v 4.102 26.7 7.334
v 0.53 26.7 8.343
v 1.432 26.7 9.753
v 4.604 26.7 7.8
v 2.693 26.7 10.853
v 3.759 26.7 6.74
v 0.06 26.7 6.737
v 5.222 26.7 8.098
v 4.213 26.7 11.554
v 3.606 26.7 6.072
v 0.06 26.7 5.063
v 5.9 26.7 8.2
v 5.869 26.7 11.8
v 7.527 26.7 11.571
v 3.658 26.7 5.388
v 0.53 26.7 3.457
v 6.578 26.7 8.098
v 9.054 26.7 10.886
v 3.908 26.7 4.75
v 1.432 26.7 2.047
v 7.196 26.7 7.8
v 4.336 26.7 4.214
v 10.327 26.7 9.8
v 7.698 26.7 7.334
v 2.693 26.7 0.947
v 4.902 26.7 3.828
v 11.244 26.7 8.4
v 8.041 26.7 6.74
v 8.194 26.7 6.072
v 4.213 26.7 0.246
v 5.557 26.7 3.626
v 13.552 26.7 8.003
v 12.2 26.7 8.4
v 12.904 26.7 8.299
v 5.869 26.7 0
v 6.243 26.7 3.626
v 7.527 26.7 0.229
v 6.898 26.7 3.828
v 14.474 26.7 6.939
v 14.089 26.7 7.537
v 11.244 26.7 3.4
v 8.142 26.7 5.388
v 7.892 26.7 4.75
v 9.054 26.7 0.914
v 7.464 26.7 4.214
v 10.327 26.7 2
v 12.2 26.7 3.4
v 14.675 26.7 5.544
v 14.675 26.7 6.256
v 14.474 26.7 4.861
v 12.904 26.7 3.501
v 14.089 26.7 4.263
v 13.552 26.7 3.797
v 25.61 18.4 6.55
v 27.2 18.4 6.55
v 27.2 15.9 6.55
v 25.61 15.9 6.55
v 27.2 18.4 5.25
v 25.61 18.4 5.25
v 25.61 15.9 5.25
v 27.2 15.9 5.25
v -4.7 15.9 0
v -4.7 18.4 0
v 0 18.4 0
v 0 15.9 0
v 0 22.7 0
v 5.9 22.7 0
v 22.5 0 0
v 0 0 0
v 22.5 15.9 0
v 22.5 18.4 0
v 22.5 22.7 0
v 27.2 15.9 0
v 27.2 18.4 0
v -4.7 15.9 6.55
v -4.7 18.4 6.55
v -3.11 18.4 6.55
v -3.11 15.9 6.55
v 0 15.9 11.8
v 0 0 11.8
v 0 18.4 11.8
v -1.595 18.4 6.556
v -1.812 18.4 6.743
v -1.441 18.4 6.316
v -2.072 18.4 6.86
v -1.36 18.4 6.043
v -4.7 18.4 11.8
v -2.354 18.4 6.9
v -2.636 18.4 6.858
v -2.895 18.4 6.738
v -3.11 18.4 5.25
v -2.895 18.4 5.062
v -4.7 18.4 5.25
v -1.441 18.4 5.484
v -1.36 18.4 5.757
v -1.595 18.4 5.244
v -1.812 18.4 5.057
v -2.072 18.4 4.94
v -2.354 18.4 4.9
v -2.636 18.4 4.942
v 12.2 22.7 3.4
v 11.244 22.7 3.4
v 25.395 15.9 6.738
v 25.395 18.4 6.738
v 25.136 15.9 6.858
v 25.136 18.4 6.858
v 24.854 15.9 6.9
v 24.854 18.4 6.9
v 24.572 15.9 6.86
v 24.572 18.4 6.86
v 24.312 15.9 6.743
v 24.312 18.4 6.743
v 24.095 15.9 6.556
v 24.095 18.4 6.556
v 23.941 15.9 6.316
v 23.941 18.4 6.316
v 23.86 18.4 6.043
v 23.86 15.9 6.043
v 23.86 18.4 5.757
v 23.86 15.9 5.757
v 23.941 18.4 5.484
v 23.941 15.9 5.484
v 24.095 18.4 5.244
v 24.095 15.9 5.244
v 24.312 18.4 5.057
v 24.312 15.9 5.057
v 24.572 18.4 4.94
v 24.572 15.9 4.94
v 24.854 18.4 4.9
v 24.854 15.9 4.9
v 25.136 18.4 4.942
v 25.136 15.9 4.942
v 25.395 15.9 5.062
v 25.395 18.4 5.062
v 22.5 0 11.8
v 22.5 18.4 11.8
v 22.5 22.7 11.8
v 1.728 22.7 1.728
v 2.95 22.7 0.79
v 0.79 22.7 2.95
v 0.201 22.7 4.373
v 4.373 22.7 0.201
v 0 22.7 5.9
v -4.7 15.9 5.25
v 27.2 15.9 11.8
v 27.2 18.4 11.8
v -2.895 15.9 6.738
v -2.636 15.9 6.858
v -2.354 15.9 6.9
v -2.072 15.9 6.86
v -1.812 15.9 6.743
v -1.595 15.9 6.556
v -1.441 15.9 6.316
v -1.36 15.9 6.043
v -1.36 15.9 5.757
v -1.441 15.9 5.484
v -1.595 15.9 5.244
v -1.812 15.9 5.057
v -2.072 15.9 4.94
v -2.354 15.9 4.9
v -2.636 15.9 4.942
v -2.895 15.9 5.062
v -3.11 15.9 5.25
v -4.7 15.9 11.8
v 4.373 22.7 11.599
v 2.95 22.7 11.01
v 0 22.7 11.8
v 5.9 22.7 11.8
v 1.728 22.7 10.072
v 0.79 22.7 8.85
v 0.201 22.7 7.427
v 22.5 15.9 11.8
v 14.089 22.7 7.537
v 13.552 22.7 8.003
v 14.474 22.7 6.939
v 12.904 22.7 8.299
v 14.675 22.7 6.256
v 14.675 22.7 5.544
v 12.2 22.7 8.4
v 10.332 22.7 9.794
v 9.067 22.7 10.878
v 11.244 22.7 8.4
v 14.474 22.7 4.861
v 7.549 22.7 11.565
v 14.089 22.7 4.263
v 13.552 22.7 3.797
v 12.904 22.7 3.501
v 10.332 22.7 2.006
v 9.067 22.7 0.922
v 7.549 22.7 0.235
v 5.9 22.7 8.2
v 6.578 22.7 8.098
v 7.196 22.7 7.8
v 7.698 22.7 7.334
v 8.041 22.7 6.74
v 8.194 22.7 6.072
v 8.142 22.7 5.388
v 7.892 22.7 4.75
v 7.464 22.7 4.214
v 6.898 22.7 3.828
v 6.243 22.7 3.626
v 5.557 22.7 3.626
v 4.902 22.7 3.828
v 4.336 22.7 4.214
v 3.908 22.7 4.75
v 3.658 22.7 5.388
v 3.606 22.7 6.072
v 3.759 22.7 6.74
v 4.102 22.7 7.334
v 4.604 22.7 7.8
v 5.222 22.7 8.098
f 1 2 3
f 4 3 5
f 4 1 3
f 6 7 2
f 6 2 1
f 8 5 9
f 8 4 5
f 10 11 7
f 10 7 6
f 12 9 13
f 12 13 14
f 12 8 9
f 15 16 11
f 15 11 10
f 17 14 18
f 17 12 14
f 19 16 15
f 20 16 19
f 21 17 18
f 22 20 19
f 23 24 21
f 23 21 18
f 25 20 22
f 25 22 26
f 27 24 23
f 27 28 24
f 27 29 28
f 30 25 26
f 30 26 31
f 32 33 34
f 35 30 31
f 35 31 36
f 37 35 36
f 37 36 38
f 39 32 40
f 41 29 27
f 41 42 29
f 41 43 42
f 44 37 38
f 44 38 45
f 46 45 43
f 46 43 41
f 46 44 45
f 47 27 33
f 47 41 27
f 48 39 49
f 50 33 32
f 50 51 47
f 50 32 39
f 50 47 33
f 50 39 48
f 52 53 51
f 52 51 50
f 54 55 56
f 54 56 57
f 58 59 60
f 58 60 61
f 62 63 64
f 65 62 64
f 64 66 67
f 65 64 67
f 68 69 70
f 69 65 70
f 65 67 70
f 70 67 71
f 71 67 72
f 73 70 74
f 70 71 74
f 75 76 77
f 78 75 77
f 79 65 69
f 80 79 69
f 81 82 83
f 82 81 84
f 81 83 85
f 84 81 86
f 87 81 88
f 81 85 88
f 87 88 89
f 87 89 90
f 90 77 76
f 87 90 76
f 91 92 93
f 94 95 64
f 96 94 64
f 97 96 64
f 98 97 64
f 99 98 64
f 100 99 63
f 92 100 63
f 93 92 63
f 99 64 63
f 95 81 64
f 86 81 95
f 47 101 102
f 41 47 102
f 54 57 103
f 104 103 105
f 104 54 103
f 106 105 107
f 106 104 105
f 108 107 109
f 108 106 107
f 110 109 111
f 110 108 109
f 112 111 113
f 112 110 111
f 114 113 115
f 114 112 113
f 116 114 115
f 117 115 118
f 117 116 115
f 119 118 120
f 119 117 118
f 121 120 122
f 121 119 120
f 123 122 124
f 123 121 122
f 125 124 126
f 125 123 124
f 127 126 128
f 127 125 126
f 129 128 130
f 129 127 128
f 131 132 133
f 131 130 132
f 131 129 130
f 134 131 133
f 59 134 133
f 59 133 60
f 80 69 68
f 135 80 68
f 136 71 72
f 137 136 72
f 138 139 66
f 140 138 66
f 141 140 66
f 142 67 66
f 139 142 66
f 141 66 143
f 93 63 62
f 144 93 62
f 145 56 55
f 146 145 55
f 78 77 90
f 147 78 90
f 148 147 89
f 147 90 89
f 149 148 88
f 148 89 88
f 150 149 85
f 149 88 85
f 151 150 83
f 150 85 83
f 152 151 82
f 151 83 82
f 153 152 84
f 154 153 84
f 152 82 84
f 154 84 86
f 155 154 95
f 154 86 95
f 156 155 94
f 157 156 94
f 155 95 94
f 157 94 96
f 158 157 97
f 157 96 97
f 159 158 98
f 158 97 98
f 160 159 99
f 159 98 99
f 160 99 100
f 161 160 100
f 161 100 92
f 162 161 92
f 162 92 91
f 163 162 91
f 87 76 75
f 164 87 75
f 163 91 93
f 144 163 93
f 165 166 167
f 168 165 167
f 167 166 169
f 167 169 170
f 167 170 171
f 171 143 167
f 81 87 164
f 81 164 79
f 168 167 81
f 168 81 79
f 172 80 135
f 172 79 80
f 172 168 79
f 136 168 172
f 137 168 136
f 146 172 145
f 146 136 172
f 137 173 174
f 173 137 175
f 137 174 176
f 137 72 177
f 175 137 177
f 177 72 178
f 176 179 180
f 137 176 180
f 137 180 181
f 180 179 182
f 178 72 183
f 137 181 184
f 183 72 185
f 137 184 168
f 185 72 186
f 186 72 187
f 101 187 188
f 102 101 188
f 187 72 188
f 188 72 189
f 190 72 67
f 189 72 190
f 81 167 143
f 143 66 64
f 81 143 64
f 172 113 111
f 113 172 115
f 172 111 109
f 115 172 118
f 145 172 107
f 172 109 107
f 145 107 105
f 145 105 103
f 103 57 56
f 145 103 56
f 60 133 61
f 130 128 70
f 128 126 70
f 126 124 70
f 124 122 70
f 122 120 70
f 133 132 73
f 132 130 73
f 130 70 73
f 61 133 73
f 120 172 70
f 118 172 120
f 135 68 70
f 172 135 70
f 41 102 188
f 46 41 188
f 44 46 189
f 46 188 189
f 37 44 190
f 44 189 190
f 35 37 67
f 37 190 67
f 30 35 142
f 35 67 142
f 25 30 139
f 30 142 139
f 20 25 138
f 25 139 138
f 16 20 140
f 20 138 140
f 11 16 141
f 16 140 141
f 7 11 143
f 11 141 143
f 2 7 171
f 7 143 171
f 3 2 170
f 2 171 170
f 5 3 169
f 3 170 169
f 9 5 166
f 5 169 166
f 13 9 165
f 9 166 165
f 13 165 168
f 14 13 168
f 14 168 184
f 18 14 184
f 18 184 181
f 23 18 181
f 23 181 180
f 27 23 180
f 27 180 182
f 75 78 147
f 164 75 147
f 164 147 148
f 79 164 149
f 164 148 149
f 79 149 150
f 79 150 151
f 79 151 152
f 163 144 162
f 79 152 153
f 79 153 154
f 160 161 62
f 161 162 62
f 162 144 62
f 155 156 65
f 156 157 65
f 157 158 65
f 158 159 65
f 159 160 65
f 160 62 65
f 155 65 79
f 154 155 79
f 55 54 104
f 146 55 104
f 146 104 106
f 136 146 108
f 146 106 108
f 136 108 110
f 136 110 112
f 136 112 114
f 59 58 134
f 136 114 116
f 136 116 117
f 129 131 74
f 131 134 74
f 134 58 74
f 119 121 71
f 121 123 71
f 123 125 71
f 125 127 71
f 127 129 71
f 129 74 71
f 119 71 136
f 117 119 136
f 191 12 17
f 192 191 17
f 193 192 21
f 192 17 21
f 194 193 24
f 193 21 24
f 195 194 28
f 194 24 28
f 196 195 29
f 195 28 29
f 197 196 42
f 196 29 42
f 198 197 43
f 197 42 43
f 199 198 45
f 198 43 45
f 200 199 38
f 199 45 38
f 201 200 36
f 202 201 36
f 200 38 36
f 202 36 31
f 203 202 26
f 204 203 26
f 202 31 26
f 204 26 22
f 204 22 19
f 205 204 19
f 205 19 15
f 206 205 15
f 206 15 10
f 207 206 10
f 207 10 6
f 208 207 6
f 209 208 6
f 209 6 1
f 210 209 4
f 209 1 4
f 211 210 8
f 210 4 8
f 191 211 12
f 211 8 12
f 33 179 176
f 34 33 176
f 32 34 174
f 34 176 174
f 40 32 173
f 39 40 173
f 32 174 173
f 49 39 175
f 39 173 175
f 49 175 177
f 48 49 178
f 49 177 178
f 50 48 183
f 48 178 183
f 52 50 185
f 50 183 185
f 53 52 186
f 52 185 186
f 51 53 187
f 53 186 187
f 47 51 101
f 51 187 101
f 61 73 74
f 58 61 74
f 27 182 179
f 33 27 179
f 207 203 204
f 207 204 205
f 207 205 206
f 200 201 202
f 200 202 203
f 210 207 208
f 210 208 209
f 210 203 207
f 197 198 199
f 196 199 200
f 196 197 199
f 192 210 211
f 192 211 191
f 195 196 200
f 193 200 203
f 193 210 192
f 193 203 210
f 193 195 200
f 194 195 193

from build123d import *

# Parameters (mm, degrees)
BOSS_EXTRUDE1_DEPTH = 11.8
BOSS_EXTRUDE2_DEPTH = 4
SKETCH3_R           = 2.3
CUT_EXTRUDE1_DEPTH  = 4
CUT_EXTRUDE2_DEPTH  = 4


with BuildPart() as part:
    # Sketch1 → Boss-Extrude1 (new body)
    with BuildSketch(Plane.XY):
        Polygon((0, 0), (22.5, 0), (22.5, 15.9), (27.2, 15.9), (27.2, 18.4), (22.5, 18.4), (22.5, 22.7), (0, 22.7), (0, 18.4), (-4.7, 18.4), (-4.7, 15.9), (0, 15.9), align=None)
    extrude(amount=BOSS_EXTRUDE1_DEPTH)

    # Sketch2 → Boss-Extrude2 (add)
    with BuildSketch(Plane(origin=(0, 22.7, 0), x_dir=(1, 0, 0), z_dir=(0, 1, 0))):
        with BuildLine():
            Line((12.2, -3.4), (11.244155686, -3.4))
            ThreePointArc((11.244155686, -3.4), (0, -5.9), (11.244155686, -8.4))
            Line((11.244155686, -8.4), (12.2, -8.4))
            ThreePointArc((12.2, -8.4), (14.7, -5.9), (12.2, -3.4))
        make_face()
    extrude(amount=BOSS_EXTRUDE2_DEPTH)

    # Sketch3 → Cut-Extrude1 (cut)
    with BuildSketch(Plane(origin=(0, 26.7, 0), x_dir=(1, 0, 0), z_dir=(0, 1, 0))):
        with Locations(Location((5.9, -5.9, 0), (0, 0, 270))):
            Circle(SKETCH3_R)
    extrude(amount=-CUT_EXTRUDE1_DEPTH, mode=Mode.SUBTRACT)

    # Sketch4 → Cut-Extrude2 (cut)
    with BuildSketch(Plane(origin=(0, 18.4, 0), x_dir=(1, 0, 0), z_dir=(0, 1, 0))):
        with BuildLine():
            Line((-4.7, -5.25), (-4.7, -6.55))
            Line((-4.7, -6.55), (-3.109934208, -6.55))
            ThreePointArc((-3.109934208, -6.55), (-1.35, -5.9), (-3.109934208, -5.25))
            Line((-3.109934208, -5.25), (-4.7, -5.25))
        make_face()
    cut_extrude2 = extrude(amount=-CUT_EXTRUDE2_DEPTH, mode=Mode.SUBTRACT)

    # Mirror1: Cut-Extrude2 across plane
    add(cut_extrude2.mirror(Plane(origin=(11.25, 0, 0), x_dir=(0, 0, 1), z_dir=(1, 0, 0))), mode=Mode.SUBTRACT)


solid = part.part
